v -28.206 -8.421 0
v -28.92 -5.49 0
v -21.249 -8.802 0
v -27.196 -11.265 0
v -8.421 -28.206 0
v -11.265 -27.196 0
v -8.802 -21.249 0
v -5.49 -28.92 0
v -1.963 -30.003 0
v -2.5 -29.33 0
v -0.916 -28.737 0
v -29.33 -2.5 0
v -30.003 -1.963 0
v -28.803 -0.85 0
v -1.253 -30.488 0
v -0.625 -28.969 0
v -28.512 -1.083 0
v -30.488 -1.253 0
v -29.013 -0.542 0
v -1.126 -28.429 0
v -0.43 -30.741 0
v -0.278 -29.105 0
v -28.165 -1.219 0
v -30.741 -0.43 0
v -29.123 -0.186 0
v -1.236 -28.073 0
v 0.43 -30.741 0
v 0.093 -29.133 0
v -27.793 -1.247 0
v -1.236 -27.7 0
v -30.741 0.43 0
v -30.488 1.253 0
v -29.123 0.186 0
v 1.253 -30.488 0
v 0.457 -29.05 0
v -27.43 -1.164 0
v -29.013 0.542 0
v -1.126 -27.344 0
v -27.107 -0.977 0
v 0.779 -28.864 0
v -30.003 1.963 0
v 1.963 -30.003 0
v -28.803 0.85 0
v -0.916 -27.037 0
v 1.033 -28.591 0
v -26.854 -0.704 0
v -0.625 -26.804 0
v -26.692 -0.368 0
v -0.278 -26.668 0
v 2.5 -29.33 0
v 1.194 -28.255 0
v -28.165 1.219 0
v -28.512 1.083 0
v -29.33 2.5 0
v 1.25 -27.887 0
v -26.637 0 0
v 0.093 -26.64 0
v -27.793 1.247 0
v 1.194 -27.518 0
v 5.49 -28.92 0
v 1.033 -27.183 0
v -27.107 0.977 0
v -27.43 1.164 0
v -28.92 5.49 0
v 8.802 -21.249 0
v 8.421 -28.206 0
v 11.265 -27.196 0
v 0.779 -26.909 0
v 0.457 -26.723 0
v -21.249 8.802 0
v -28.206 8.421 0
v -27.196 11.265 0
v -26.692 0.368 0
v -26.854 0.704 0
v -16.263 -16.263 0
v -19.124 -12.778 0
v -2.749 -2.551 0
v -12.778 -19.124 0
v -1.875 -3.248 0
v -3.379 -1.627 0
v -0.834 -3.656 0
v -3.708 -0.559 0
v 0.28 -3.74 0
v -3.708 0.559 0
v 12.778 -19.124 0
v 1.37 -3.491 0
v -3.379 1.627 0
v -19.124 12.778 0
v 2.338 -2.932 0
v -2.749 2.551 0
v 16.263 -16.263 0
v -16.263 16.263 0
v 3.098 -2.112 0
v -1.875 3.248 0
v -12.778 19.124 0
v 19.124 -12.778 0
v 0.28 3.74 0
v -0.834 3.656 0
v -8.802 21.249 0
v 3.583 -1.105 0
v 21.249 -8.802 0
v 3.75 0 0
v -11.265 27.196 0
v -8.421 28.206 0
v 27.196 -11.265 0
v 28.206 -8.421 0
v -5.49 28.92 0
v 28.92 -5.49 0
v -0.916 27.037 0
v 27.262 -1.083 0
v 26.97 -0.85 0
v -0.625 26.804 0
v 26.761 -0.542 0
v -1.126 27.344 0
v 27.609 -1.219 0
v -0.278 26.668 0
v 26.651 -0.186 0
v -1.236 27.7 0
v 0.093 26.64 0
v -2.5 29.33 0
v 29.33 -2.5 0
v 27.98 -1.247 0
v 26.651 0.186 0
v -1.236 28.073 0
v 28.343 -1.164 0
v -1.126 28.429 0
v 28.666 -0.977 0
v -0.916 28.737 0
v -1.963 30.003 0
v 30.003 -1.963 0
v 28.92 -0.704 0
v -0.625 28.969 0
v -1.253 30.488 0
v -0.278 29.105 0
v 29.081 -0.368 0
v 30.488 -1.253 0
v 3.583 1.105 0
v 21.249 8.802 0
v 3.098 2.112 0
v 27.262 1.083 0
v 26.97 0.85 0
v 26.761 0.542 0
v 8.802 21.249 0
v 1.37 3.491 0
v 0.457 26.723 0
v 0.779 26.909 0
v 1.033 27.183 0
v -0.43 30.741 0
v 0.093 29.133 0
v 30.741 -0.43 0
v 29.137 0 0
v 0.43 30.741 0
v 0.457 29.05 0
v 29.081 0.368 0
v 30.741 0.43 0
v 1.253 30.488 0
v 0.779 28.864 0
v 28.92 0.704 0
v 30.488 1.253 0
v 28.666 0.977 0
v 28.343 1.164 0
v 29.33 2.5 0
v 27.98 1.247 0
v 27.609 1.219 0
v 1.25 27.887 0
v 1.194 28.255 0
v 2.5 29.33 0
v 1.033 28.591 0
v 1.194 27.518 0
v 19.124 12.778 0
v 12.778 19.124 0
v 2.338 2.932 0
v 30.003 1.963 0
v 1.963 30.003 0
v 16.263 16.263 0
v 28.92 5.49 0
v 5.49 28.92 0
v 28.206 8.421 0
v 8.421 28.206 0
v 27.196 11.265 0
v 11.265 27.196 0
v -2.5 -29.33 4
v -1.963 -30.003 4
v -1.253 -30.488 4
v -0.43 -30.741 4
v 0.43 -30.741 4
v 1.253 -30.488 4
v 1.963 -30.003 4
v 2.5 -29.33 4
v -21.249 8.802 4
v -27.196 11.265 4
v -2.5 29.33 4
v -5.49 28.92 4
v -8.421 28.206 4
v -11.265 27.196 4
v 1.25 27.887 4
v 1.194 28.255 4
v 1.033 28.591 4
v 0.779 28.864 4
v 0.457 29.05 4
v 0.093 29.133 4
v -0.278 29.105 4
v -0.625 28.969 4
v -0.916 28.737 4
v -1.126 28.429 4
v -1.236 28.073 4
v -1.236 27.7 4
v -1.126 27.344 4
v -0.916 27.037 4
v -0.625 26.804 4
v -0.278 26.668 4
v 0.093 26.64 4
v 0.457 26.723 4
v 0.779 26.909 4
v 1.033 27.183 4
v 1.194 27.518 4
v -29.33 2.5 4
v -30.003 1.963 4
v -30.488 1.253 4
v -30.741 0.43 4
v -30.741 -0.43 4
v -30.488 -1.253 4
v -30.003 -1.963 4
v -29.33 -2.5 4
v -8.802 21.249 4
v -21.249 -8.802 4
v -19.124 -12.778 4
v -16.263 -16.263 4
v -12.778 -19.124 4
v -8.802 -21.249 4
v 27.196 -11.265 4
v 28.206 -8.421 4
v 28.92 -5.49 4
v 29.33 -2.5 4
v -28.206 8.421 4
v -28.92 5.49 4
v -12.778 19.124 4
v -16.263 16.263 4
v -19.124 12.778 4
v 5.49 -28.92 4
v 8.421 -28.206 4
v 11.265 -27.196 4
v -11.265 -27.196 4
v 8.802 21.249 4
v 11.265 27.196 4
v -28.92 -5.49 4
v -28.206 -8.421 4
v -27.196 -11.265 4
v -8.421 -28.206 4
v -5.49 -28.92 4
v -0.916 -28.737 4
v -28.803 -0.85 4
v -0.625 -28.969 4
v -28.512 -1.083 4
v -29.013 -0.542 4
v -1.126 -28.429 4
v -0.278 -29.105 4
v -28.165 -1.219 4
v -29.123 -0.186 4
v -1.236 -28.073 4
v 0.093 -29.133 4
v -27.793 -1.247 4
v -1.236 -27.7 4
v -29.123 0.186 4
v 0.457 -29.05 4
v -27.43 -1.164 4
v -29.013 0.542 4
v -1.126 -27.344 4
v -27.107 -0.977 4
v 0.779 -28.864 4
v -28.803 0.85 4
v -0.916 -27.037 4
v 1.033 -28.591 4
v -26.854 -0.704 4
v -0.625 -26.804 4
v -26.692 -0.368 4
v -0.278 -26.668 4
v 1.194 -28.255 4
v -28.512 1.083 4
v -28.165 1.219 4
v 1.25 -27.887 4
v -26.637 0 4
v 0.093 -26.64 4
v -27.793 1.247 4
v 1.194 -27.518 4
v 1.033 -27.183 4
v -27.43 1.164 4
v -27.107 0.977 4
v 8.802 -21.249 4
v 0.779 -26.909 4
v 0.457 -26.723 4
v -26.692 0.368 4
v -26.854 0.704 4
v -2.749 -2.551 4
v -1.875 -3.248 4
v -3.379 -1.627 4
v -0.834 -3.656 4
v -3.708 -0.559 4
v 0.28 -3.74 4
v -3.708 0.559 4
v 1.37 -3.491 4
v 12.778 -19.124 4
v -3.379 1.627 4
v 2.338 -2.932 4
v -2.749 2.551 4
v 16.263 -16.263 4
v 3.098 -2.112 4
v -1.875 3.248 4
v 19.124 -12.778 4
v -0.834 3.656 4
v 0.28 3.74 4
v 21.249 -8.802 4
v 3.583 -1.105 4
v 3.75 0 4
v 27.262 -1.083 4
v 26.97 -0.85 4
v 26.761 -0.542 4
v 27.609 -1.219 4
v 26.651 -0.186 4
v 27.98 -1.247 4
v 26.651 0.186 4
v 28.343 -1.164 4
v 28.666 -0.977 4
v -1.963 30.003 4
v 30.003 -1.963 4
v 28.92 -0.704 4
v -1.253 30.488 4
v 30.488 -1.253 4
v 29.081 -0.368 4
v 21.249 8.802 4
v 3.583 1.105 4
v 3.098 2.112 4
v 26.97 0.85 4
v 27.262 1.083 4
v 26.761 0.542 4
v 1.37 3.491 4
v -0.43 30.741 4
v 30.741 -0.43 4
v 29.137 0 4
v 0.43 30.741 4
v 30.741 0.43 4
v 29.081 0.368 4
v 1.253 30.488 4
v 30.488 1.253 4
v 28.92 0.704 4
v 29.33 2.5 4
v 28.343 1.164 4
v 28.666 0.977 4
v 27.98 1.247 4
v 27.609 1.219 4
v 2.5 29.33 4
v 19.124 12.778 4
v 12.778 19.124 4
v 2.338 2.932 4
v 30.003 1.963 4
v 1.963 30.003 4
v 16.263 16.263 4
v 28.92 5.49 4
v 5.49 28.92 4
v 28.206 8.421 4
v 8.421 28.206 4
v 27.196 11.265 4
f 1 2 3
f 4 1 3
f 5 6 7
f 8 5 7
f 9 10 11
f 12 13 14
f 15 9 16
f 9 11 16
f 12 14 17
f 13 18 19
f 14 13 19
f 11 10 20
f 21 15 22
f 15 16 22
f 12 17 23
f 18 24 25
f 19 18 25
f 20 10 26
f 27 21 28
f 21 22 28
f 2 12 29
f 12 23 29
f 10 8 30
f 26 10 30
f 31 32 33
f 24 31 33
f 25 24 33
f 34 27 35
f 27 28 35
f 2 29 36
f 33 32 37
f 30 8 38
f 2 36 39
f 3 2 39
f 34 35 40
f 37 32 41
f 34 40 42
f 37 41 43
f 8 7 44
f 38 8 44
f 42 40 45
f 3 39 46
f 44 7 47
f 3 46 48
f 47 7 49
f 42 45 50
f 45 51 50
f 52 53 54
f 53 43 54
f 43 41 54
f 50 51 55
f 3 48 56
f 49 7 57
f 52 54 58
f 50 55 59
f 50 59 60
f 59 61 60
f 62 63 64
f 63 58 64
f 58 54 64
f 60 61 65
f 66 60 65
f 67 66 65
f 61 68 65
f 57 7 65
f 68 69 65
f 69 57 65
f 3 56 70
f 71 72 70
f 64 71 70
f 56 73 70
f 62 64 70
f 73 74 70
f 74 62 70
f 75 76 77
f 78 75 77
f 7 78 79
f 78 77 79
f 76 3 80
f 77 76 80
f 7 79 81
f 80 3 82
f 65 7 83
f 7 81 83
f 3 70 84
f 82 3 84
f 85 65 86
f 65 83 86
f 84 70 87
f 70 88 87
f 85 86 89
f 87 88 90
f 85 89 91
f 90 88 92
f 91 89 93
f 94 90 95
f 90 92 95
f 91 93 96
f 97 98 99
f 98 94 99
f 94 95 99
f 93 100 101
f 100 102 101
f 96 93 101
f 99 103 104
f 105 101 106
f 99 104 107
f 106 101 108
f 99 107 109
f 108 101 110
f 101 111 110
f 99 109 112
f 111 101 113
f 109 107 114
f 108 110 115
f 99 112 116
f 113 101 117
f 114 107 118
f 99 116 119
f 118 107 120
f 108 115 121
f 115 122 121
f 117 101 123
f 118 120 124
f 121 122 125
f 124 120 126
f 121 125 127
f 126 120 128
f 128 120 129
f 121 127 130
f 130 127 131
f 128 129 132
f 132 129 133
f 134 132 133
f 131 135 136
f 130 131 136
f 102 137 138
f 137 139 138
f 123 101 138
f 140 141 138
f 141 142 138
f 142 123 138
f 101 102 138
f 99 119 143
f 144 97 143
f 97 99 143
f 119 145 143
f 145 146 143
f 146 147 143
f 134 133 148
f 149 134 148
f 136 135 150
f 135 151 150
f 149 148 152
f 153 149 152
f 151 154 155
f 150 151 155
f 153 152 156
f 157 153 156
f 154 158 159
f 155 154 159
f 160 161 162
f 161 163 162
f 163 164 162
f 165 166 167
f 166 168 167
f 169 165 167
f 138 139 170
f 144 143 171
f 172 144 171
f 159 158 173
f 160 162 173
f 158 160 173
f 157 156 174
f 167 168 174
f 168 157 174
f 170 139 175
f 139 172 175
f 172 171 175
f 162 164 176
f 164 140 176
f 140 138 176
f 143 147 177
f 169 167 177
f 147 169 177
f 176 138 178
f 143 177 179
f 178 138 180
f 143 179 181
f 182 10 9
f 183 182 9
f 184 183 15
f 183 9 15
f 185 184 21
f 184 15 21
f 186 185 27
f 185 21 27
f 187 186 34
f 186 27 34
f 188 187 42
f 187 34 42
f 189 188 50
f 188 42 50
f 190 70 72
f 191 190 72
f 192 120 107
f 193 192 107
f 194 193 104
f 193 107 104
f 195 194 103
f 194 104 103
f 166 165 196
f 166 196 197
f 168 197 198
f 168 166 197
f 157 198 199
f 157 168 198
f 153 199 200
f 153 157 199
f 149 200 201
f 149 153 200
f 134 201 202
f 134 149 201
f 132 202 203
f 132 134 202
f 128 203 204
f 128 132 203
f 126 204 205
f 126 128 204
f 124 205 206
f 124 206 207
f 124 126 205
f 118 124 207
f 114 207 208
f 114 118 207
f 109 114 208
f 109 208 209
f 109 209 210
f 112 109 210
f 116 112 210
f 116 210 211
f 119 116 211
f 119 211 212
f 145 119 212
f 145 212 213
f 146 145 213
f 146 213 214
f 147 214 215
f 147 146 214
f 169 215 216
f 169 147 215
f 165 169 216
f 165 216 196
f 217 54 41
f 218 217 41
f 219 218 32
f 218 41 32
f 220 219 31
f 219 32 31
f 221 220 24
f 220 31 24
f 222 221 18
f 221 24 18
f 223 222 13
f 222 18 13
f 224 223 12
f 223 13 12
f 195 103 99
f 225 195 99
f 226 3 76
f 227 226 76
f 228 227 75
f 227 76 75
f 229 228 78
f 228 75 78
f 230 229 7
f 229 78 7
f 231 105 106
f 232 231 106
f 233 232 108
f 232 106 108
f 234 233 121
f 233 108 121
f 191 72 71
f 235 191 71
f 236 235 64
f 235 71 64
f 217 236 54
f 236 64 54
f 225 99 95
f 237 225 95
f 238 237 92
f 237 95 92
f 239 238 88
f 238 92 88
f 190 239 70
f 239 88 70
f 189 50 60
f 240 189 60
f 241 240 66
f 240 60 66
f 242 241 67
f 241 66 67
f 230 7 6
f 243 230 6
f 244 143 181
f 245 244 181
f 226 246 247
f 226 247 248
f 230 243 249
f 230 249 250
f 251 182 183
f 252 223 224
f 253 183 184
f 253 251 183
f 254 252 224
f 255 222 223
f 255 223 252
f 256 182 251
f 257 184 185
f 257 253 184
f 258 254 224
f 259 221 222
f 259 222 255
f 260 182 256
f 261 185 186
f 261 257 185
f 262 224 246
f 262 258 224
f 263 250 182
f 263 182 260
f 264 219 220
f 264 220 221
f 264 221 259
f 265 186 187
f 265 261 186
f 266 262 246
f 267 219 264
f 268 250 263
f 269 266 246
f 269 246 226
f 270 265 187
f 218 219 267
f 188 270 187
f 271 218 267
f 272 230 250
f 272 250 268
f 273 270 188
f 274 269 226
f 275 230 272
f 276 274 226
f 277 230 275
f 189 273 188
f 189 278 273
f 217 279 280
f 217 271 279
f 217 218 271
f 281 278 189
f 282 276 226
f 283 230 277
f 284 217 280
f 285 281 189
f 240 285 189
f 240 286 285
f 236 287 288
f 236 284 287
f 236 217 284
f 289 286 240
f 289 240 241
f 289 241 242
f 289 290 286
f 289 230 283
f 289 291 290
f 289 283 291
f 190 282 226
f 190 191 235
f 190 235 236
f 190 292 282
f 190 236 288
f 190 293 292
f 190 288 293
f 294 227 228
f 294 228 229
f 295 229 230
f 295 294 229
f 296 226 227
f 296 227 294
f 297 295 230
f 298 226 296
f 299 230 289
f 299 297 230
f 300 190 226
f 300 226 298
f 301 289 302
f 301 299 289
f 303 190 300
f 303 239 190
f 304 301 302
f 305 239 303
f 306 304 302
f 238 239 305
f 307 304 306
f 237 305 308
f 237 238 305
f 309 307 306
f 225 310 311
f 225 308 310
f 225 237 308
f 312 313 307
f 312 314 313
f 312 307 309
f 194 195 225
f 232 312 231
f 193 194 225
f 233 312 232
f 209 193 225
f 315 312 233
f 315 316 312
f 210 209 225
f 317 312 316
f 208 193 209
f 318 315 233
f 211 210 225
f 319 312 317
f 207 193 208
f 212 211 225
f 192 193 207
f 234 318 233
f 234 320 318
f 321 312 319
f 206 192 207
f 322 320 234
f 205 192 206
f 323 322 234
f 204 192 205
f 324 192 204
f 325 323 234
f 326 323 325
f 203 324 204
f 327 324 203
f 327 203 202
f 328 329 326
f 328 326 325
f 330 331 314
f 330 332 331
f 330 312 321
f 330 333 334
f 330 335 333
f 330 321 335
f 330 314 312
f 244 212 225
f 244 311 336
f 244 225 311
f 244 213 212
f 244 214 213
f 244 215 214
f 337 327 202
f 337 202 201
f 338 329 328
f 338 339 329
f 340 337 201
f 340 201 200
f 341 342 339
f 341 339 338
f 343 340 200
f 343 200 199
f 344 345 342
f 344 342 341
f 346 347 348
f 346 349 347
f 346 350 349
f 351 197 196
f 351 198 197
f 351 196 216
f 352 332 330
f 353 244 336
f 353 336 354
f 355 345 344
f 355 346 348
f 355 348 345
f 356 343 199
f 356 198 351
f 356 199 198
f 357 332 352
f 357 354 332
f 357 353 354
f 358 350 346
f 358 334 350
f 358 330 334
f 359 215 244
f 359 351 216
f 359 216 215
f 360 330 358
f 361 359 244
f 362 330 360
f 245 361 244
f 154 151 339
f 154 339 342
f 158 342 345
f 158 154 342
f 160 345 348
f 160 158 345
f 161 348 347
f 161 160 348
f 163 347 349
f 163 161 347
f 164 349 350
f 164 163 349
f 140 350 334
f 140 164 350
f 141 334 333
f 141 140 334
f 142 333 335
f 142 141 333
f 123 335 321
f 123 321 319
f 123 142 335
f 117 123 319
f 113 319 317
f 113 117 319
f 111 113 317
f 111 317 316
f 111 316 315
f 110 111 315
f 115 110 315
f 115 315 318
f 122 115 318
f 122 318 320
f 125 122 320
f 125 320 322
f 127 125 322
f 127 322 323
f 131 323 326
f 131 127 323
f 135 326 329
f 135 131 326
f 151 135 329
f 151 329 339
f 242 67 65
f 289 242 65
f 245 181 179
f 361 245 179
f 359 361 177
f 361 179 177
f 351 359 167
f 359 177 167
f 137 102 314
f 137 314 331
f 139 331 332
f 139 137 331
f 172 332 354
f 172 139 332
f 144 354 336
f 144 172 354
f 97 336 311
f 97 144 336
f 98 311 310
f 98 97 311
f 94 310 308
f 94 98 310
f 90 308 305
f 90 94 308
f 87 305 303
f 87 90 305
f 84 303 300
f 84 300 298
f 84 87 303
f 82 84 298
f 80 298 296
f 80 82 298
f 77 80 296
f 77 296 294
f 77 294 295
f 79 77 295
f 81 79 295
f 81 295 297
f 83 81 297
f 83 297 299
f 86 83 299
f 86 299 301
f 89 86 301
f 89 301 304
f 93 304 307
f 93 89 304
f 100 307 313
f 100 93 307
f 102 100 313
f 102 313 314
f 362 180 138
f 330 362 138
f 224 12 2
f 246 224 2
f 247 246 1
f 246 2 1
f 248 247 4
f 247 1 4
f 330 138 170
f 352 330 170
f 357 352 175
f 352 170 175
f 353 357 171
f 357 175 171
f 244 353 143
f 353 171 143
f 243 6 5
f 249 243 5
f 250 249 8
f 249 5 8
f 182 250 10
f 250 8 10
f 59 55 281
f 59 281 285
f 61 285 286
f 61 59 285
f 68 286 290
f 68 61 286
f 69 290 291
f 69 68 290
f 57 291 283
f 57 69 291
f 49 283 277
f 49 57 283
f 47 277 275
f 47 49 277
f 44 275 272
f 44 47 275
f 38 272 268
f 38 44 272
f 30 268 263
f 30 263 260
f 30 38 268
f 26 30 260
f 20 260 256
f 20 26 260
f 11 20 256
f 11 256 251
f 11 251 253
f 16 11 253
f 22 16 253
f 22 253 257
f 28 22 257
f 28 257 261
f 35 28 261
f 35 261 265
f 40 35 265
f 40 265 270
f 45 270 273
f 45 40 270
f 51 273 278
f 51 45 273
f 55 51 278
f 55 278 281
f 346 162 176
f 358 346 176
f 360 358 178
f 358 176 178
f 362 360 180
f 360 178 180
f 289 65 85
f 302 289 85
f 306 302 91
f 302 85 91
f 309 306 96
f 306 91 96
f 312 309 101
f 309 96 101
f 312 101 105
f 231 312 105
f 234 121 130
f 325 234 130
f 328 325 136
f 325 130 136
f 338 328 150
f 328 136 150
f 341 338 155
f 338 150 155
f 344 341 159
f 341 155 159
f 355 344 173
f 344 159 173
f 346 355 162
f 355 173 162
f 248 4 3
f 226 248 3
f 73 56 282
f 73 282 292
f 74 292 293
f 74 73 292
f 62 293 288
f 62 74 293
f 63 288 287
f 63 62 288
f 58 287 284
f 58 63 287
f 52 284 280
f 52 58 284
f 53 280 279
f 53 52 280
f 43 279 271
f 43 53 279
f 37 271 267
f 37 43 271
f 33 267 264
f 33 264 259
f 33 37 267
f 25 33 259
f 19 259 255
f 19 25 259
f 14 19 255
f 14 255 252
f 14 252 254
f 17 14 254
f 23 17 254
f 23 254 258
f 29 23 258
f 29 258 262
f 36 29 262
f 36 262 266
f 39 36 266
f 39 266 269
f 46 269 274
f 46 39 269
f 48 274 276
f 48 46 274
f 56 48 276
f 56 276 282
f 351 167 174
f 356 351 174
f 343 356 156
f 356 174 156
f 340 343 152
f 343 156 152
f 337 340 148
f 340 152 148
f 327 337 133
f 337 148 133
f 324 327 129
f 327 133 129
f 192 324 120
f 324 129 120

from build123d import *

# Parameters (mm, degrees)
SKETCH1_R           = 1.25
SKETCH1_R_2         = 3.75
BOSS_EXTRUDE2_DEPTH = 4


with BuildPart() as part:
    # Sketch1 → Boss-Extrude2 (new body)
    with BuildSketch(Plane.XY):
        with BuildLine():
            Line((-21.249229248, 8.801718944), (-27.195761321, 11.264853178))
            ThreePointArc((-27.195761321, 11.264853178), (-28.600693627, 6.964673358), (-29.330127019, 2.5))
            ThreePointArc((-29.330127019, 2.5), (-30.773502692, 0), (-29.330127019, -2.5))
            ThreePointArc((-29.330127019, -2.5), (-28.600693627, -6.964673358), (-27.195761321, -11.264853178))
            Line((-27.195761321, -11.264853178), (-21.249229248, -8.801718944))
            ThreePointArc((-21.249229248, -8.801718944), (-16.263455967, -16.263455967), (-8.801718944, -21.249229248))
            Line((-8.801718944, -21.249229248), (-11.264853178, -27.195761321))
            ThreePointArc((-11.264853178, -27.195761321), (-6.964673358, -28.600693627), (-2.5, -29.330127019))
            ThreePointArc((-2.5, -29.330127019), (0, -30.773502692), (2.5, -29.330127019))
            ThreePointArc((2.5, -29.330127019), (6.964673358, -28.600693627), (11.264853178, -27.195761321))
            Line((11.264853178, -27.195761321), (8.801718944, -21.249229248))
            ThreePointArc((8.801718944, -21.249229248), (16.263455967, -16.263455967), (21.249229248, -8.801718944))
            Line((21.249229248, -8.801718944), (27.195761321, -11.264853178))
            ThreePointArc((27.195761321, -11.264853178), (28.600693627, -6.964673358), (29.330127019, -2.5))
            ThreePointArc((29.330127019, -2.5), (30.773502692, 0), (29.330127019, 2.5))
            ThreePointArc((29.330127019, 2.5), (28.600693627, 6.964673358), (27.195761321, 11.264853178))
            Line((27.195761321, 11.264853178), (21.249229248, 8.801718944))
            ThreePointArc((21.249229248, 8.801718944), (16.263455967, 16.263455967), (8.801718944, 21.249229248))
            Line((8.801718944, 21.249229248), (11.264853178, 27.195761321))
            ThreePointArc((11.264853178, 27.195761321), (6.964673358, 28.600693627), (2.5, 29.330127019))
            ThreePointArc((2.5, 29.330127019), (0, 30.773502692), (-2.5, 29.330127019))
            ThreePointArc((-2.5, 29.330127019), (-6.964673358, 28.600693627), (-11.264853178, 27.195761321))
            Line((-11.264853178, 27.195761321), (-8.801718944, 21.249229248))
            ThreePointArc((-8.801718944, 21.249229248), (-16.263455967, 16.263455967), (-21.249229248, 8.801718944))
        make_face()
        with Locations((0, -27.886751346)):
            Circle(SKETCH1_R, mode=Mode.SUBTRACT)
        Circle(SKETCH1_R_2, mode=Mode.SUBTRACT)
        with Locations((27.886751346, 0)):
            Circle(SKETCH1_R, mode=Mode.SUBTRACT)
        with Locations((-27.886751346, 0)):
            Circle(SKETCH1_R, mode=Mode.SUBTRACT)
        with Locations((0, 27.886751346)):
            Circle(SKETCH1_R, mode=Mode.SUBTRACT)
    extrude(amount=BOSS_EXTRUDE2_DEPTH)


solid = part.part
